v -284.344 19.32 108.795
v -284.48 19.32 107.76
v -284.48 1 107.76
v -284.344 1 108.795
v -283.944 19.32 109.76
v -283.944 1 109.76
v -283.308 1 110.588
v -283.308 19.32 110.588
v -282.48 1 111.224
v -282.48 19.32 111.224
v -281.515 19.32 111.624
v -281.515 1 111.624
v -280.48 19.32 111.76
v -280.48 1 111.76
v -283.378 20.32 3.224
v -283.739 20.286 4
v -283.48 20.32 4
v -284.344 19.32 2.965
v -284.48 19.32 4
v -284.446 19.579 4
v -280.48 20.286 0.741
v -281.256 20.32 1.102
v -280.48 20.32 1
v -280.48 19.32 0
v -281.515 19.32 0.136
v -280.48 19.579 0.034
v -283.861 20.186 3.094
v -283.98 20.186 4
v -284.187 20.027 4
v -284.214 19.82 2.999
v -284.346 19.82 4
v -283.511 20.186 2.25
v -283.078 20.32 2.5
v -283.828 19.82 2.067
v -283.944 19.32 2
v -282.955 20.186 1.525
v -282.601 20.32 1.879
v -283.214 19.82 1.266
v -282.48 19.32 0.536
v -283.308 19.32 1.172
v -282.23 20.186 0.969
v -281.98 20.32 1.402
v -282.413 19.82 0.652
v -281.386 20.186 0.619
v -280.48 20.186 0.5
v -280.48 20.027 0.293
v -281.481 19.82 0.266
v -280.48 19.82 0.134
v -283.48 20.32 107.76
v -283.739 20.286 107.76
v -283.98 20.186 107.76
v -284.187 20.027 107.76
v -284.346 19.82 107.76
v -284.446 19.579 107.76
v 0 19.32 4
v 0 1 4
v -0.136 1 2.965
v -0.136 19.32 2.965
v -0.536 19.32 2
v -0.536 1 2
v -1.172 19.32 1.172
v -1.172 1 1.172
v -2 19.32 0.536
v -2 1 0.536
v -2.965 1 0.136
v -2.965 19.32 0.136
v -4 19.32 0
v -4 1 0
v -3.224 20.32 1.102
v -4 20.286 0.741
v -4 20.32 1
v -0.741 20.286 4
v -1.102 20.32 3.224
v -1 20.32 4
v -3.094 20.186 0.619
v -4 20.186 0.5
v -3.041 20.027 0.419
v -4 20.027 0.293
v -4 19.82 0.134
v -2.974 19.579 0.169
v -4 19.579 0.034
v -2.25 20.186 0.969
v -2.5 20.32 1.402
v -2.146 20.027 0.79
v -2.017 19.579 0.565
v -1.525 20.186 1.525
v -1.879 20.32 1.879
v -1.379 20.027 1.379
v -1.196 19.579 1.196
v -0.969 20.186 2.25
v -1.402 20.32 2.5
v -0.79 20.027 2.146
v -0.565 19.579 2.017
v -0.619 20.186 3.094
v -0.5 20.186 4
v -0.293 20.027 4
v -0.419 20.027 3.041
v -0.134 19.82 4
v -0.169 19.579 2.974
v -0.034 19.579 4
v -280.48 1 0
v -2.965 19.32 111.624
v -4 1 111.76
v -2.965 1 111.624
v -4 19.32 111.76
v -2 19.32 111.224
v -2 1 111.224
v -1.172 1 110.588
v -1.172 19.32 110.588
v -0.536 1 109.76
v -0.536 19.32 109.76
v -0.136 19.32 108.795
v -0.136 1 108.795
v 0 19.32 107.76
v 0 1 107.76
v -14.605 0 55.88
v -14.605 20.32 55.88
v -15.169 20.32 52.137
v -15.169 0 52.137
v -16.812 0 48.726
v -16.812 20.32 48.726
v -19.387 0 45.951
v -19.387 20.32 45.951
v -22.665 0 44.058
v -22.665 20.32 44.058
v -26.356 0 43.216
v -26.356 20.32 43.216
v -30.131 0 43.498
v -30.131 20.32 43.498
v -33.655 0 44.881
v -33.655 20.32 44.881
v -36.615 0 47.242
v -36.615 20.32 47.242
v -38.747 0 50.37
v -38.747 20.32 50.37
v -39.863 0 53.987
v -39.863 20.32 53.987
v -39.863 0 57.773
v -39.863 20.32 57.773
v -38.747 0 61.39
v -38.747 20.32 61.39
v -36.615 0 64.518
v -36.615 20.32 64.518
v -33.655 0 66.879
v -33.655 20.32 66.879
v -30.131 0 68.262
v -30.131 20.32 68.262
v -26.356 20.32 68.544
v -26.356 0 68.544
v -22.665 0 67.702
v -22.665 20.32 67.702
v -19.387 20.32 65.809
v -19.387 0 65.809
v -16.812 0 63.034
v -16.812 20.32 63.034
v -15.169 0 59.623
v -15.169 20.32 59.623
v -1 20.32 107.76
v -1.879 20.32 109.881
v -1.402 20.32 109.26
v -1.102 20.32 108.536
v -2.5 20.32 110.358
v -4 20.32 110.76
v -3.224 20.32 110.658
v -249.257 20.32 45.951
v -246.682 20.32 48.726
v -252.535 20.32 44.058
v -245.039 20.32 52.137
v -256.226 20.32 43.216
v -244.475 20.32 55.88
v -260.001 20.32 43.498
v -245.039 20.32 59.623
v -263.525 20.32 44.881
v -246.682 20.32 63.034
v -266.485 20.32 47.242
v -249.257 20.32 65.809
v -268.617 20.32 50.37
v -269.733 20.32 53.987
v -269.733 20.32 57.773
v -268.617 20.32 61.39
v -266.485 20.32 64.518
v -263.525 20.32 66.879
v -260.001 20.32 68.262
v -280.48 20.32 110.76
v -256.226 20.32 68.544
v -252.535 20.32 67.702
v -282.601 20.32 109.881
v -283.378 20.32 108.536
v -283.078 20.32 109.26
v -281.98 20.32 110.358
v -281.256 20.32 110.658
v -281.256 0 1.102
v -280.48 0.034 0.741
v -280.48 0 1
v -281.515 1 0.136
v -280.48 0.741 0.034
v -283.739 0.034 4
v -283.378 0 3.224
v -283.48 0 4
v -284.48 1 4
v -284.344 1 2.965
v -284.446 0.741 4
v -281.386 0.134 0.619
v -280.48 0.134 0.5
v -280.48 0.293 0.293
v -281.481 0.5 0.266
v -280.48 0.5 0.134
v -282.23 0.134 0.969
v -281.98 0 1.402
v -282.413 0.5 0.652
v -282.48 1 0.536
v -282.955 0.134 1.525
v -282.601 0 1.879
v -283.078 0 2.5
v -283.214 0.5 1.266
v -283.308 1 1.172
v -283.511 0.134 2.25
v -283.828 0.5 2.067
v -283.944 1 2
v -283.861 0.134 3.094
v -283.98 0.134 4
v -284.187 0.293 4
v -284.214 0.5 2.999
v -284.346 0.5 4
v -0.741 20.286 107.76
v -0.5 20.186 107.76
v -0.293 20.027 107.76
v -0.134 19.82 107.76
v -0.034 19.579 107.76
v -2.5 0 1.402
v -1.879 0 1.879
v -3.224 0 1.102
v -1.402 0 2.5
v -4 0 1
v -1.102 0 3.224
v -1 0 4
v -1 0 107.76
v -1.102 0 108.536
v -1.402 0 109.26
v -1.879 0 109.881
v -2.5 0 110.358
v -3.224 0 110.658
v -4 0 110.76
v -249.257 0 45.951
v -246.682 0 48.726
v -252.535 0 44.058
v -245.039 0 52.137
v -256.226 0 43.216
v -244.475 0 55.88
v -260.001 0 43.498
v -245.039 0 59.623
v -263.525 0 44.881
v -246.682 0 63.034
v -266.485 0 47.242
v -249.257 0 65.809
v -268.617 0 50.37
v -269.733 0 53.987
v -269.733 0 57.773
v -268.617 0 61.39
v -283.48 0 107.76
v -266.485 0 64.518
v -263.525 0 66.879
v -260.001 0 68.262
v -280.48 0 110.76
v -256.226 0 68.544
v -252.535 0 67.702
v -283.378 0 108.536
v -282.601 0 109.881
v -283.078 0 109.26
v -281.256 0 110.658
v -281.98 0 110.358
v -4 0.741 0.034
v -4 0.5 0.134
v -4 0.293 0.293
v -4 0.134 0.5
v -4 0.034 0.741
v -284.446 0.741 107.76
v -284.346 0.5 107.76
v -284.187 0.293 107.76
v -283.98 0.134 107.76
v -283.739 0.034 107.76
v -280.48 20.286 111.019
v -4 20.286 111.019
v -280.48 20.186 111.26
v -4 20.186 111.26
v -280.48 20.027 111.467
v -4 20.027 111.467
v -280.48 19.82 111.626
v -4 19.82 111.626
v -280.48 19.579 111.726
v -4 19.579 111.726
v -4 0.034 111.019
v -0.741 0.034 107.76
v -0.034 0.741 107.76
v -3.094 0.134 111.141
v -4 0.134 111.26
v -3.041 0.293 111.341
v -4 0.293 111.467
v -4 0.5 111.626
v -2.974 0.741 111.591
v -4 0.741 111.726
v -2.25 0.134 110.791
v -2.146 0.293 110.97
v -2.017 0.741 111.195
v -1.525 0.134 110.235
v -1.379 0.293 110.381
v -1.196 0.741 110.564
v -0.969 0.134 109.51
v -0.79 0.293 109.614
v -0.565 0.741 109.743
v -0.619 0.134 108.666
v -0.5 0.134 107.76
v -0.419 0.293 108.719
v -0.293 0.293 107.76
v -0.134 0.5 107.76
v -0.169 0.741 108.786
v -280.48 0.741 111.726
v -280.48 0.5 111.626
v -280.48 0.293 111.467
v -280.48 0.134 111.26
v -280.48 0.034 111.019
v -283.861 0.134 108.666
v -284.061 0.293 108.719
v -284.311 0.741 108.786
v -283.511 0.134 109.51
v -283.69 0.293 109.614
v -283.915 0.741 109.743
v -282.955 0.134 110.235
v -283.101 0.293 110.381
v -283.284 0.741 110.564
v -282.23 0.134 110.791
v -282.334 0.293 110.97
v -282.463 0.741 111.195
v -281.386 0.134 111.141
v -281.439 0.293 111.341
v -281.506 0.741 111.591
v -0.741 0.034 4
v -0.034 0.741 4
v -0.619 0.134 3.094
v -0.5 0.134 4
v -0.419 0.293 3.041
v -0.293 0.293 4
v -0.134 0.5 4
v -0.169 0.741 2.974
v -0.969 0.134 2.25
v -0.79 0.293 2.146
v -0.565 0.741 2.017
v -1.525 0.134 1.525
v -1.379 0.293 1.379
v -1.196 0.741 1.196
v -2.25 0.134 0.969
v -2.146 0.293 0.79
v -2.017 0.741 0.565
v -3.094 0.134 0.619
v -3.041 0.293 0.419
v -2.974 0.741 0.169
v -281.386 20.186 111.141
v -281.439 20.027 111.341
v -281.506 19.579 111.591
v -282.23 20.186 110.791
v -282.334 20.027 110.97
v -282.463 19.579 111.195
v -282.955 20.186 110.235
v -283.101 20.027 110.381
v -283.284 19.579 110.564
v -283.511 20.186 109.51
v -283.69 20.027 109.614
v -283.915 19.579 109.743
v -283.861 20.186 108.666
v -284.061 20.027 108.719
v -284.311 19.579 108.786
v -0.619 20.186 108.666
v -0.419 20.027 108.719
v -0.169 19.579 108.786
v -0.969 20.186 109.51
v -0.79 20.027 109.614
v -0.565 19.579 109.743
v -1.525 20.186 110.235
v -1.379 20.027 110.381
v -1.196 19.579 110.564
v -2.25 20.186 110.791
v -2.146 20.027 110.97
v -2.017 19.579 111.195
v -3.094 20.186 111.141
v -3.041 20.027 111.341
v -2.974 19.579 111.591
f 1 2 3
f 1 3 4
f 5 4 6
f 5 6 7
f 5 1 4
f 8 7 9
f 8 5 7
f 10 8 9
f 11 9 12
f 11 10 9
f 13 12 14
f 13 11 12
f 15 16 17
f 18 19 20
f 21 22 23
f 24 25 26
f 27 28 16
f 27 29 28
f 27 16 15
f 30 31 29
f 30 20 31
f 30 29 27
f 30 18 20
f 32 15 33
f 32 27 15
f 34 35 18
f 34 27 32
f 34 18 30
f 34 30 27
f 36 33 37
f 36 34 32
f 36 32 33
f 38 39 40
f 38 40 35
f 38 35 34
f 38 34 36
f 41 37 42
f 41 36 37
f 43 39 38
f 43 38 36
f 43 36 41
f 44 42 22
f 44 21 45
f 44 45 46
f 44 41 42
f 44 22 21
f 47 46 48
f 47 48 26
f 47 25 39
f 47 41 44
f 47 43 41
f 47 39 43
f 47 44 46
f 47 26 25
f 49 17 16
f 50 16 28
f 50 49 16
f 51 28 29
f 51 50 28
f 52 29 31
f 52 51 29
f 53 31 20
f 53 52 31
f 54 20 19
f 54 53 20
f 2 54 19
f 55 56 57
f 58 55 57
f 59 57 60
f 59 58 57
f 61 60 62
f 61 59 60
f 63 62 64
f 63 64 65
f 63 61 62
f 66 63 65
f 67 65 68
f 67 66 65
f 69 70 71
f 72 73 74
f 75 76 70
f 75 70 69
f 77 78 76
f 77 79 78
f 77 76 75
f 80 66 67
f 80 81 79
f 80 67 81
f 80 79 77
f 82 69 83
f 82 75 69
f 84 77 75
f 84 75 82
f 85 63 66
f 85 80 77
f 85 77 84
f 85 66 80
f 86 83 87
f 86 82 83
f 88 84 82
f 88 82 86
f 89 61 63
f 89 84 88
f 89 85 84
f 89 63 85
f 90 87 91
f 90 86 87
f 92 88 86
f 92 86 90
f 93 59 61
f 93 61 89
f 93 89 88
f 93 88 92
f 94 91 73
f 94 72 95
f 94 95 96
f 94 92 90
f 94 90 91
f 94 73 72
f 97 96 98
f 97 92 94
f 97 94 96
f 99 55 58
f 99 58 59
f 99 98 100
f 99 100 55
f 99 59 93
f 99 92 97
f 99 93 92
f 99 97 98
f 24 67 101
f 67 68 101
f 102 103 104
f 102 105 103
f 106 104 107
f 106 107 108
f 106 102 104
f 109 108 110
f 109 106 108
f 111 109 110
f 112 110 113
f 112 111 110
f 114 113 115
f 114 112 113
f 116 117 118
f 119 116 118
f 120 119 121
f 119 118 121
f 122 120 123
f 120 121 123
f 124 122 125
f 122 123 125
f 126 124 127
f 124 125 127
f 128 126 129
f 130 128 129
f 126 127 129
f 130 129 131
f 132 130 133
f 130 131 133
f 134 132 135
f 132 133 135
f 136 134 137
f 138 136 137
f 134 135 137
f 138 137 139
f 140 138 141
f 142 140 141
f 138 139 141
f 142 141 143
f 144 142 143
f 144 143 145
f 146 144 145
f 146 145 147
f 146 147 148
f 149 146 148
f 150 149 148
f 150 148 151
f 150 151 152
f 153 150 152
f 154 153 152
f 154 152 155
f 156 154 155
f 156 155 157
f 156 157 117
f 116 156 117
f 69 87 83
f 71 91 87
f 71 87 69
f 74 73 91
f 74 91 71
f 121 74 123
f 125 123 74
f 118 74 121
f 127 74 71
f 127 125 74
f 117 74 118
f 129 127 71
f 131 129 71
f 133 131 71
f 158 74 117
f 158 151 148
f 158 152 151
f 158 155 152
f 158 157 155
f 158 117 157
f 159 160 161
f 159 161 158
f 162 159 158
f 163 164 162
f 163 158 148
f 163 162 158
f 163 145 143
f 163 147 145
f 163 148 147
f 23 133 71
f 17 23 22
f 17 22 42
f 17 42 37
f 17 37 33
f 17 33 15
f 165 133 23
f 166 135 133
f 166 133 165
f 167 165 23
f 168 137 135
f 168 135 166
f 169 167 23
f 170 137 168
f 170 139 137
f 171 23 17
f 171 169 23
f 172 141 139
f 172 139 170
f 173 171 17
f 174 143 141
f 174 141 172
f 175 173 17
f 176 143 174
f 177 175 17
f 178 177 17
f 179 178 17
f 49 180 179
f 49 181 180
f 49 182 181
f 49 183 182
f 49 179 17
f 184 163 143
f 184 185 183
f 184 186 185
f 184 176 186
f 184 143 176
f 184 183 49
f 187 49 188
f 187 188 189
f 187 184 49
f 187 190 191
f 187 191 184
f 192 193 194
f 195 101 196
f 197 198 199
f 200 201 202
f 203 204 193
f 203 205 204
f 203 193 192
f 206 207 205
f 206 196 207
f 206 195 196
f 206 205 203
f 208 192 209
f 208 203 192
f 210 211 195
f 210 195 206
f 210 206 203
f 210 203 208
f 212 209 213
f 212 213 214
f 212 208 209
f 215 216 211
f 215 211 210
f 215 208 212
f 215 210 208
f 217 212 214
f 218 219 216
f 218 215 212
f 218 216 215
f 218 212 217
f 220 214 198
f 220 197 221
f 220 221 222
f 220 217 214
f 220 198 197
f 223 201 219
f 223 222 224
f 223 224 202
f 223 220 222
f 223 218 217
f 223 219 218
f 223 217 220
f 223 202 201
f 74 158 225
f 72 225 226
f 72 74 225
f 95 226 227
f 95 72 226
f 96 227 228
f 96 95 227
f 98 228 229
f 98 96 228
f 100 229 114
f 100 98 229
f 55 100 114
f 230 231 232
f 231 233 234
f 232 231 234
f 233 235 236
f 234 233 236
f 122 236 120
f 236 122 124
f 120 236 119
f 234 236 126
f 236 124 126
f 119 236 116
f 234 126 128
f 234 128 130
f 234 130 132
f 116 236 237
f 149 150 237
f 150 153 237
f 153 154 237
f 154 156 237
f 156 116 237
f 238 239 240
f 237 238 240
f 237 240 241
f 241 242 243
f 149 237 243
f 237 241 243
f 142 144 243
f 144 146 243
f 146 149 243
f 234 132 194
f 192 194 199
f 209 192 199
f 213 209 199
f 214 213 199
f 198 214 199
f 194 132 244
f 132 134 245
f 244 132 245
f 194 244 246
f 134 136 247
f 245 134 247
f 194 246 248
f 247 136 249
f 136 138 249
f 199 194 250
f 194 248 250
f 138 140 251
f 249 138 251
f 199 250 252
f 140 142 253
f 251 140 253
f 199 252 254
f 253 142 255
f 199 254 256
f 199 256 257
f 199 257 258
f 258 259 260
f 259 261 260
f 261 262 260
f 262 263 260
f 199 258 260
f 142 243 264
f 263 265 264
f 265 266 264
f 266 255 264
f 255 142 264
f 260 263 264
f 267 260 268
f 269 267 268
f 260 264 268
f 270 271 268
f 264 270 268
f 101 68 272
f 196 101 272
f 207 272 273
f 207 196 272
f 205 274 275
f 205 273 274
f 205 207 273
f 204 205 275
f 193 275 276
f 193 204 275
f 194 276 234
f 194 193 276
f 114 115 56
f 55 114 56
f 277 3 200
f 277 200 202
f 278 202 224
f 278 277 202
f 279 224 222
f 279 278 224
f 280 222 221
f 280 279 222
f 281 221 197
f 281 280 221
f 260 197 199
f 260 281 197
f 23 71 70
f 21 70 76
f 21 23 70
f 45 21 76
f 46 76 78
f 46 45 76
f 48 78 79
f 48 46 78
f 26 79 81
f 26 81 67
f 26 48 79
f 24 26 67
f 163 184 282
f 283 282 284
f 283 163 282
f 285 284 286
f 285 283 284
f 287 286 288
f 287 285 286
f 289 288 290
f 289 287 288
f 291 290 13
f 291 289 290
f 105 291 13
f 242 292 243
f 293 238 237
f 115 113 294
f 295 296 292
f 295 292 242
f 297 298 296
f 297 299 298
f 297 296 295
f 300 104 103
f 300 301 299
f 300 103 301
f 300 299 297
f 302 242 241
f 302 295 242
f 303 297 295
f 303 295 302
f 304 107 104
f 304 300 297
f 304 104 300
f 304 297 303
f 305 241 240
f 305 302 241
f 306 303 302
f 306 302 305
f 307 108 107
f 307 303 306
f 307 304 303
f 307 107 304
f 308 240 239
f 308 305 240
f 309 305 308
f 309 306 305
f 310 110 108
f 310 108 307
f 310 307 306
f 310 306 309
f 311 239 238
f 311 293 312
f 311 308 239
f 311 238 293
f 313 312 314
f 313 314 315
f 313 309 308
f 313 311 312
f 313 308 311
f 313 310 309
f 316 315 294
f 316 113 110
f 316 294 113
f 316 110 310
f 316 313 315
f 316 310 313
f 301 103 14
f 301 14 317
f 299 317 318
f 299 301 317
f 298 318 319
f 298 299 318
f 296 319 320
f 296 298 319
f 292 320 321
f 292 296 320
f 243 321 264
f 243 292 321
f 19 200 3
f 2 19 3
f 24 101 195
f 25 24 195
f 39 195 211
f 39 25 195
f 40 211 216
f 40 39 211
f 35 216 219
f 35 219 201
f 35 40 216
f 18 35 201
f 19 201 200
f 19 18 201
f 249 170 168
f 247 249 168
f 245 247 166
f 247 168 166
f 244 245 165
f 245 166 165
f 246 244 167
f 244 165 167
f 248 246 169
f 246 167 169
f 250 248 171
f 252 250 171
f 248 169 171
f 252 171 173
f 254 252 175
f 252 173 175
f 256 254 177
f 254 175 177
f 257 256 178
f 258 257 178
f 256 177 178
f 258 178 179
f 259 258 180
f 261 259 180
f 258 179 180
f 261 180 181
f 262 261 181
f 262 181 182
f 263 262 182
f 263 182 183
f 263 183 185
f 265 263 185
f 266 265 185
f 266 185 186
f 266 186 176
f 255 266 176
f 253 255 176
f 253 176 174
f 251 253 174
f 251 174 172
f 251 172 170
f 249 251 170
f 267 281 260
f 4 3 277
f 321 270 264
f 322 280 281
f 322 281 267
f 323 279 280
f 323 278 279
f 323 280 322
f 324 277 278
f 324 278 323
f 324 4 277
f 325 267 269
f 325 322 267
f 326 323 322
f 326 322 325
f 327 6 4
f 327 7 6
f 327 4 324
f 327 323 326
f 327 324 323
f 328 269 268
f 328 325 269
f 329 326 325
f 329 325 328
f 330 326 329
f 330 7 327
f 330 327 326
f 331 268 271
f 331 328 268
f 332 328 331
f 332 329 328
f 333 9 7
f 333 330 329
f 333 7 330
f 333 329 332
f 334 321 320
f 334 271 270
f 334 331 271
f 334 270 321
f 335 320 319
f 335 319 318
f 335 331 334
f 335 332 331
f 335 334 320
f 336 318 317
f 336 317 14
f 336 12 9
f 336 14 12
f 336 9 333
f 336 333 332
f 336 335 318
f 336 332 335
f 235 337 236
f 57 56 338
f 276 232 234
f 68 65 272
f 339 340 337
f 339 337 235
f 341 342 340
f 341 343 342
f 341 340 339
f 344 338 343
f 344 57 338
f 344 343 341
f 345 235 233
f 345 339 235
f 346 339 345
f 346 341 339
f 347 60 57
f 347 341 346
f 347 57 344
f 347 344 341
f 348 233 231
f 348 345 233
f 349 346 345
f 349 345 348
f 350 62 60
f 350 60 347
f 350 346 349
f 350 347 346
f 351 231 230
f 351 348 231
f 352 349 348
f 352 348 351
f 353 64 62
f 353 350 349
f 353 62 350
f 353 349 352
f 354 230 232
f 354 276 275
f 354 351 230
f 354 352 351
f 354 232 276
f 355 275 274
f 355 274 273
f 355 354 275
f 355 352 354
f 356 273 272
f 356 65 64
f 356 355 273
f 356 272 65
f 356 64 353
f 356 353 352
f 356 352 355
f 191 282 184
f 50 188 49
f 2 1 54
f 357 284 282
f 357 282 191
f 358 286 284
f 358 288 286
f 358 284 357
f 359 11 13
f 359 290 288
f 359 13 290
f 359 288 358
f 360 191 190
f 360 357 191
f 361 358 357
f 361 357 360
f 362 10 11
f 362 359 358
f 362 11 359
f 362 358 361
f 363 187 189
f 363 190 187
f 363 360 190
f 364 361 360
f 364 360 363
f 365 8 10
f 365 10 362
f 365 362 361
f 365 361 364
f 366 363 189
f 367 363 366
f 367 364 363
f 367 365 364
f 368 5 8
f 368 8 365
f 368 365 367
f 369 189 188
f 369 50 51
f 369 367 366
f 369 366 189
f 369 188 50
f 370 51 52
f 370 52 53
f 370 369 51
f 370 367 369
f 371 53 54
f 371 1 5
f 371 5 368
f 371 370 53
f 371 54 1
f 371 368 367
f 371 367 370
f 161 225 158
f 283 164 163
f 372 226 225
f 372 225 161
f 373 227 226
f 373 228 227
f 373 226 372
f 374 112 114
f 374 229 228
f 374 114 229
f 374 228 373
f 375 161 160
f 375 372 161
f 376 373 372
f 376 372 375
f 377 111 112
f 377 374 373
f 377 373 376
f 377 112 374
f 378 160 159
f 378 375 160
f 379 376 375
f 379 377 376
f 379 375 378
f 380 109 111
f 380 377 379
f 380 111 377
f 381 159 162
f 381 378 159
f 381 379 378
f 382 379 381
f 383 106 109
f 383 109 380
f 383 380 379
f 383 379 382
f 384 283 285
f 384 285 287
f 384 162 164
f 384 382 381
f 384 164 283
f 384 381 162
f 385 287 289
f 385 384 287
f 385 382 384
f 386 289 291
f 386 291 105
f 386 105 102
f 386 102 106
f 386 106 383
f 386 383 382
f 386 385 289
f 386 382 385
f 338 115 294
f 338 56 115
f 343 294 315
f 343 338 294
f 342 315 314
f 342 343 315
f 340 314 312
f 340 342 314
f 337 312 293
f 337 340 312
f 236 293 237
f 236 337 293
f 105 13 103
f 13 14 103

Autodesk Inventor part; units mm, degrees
ref_plane "YZ Plane" through (0, 0, 0) normal (1, 0, 0) x (0, 1, 0)
ref_plane "XZ Plane" through (0, 0, 0) normal (0, 1, 0) x (-1, 0, 0)
ref_plane "XY Plane" through (0, 0, 0) normal (0, 0, 1) x (1, 0, 0)
sketch "Sketch1" plane through (0, 0, 0) normal (0, 1, 0) x (-1, 0, 0)
  line L0 (0, 0) -> (284.48, 0)
  line L1 (284.48, 0) -> (284.48, 111.76)
  line L2 (284.48, 111.76) -> (0, 111.76)
  line L3 (0, 111.76) -> (0, 0)
  dimension "d0" = 284.48
  dimension "d1" = 111.76
extrude "Extrusion1" add sketch "Sketch1" along normal blind 20.32
sketch "Sketch2" plane through (0, 20.32, 0) normal (0, 1, 0) x (1, 0, 0)
  line L0 (-284.48, 0) -> (-284.48, -111.76) projected
  line L1 (0, -111.76) -> (0, 0) projected
  line L2 (-284.48, -55.88) -> (-257.175, -55.88) construction
  line L3 (0, -55.88) -> (-27.305, -55.88) construction
  circle A0 centre (-27.305, -55.88) radius 12.7
  circle A1 centre (-257.175, -55.88) radius 12.7
  dimension "d4" = 27.305
  dimension "d5" = 27.305
  dimension "d6" = 25.4
  dimension "d7" = 25.4
extrude "Extrusion2" cut sketch "Sketch2" against normal blind 20.32
fillet "Fillet1" radius 4 4 edges at (-284.48, 10.16, 111.76) (-284.48, 10.16, 0) (0, 10.16, 111.76) (0, 10.16, 0)
fillet "Fillet2" radius 1 16 edges at (-283.3084, 0, 1.1716) (-284.48, 0, 55.88) (-283.3084, 0, 110.5884) (-142.24, 0, 111.76) (-1.1716, 0, 110.5884) (0, 0, 55.88) (-1.1716, 0, 1.1716) (-142.24, 0, 0) (-283.3084, 20.32, 1.1716) (-284.48, 20.32, 55.88) (-283.3084, 20.32, 110.5884) (-142.24, 20.32, 111.76) (-1.1716, 20.32, 110.5884) (0, 20.32, 55.88) (-1.1716, 20.32, 1.1716) (-142.24, 20.32, 0)
equation "\"d5\" = d4"
properties part number "CIM Mount Top" material "Aluminum 6061"
